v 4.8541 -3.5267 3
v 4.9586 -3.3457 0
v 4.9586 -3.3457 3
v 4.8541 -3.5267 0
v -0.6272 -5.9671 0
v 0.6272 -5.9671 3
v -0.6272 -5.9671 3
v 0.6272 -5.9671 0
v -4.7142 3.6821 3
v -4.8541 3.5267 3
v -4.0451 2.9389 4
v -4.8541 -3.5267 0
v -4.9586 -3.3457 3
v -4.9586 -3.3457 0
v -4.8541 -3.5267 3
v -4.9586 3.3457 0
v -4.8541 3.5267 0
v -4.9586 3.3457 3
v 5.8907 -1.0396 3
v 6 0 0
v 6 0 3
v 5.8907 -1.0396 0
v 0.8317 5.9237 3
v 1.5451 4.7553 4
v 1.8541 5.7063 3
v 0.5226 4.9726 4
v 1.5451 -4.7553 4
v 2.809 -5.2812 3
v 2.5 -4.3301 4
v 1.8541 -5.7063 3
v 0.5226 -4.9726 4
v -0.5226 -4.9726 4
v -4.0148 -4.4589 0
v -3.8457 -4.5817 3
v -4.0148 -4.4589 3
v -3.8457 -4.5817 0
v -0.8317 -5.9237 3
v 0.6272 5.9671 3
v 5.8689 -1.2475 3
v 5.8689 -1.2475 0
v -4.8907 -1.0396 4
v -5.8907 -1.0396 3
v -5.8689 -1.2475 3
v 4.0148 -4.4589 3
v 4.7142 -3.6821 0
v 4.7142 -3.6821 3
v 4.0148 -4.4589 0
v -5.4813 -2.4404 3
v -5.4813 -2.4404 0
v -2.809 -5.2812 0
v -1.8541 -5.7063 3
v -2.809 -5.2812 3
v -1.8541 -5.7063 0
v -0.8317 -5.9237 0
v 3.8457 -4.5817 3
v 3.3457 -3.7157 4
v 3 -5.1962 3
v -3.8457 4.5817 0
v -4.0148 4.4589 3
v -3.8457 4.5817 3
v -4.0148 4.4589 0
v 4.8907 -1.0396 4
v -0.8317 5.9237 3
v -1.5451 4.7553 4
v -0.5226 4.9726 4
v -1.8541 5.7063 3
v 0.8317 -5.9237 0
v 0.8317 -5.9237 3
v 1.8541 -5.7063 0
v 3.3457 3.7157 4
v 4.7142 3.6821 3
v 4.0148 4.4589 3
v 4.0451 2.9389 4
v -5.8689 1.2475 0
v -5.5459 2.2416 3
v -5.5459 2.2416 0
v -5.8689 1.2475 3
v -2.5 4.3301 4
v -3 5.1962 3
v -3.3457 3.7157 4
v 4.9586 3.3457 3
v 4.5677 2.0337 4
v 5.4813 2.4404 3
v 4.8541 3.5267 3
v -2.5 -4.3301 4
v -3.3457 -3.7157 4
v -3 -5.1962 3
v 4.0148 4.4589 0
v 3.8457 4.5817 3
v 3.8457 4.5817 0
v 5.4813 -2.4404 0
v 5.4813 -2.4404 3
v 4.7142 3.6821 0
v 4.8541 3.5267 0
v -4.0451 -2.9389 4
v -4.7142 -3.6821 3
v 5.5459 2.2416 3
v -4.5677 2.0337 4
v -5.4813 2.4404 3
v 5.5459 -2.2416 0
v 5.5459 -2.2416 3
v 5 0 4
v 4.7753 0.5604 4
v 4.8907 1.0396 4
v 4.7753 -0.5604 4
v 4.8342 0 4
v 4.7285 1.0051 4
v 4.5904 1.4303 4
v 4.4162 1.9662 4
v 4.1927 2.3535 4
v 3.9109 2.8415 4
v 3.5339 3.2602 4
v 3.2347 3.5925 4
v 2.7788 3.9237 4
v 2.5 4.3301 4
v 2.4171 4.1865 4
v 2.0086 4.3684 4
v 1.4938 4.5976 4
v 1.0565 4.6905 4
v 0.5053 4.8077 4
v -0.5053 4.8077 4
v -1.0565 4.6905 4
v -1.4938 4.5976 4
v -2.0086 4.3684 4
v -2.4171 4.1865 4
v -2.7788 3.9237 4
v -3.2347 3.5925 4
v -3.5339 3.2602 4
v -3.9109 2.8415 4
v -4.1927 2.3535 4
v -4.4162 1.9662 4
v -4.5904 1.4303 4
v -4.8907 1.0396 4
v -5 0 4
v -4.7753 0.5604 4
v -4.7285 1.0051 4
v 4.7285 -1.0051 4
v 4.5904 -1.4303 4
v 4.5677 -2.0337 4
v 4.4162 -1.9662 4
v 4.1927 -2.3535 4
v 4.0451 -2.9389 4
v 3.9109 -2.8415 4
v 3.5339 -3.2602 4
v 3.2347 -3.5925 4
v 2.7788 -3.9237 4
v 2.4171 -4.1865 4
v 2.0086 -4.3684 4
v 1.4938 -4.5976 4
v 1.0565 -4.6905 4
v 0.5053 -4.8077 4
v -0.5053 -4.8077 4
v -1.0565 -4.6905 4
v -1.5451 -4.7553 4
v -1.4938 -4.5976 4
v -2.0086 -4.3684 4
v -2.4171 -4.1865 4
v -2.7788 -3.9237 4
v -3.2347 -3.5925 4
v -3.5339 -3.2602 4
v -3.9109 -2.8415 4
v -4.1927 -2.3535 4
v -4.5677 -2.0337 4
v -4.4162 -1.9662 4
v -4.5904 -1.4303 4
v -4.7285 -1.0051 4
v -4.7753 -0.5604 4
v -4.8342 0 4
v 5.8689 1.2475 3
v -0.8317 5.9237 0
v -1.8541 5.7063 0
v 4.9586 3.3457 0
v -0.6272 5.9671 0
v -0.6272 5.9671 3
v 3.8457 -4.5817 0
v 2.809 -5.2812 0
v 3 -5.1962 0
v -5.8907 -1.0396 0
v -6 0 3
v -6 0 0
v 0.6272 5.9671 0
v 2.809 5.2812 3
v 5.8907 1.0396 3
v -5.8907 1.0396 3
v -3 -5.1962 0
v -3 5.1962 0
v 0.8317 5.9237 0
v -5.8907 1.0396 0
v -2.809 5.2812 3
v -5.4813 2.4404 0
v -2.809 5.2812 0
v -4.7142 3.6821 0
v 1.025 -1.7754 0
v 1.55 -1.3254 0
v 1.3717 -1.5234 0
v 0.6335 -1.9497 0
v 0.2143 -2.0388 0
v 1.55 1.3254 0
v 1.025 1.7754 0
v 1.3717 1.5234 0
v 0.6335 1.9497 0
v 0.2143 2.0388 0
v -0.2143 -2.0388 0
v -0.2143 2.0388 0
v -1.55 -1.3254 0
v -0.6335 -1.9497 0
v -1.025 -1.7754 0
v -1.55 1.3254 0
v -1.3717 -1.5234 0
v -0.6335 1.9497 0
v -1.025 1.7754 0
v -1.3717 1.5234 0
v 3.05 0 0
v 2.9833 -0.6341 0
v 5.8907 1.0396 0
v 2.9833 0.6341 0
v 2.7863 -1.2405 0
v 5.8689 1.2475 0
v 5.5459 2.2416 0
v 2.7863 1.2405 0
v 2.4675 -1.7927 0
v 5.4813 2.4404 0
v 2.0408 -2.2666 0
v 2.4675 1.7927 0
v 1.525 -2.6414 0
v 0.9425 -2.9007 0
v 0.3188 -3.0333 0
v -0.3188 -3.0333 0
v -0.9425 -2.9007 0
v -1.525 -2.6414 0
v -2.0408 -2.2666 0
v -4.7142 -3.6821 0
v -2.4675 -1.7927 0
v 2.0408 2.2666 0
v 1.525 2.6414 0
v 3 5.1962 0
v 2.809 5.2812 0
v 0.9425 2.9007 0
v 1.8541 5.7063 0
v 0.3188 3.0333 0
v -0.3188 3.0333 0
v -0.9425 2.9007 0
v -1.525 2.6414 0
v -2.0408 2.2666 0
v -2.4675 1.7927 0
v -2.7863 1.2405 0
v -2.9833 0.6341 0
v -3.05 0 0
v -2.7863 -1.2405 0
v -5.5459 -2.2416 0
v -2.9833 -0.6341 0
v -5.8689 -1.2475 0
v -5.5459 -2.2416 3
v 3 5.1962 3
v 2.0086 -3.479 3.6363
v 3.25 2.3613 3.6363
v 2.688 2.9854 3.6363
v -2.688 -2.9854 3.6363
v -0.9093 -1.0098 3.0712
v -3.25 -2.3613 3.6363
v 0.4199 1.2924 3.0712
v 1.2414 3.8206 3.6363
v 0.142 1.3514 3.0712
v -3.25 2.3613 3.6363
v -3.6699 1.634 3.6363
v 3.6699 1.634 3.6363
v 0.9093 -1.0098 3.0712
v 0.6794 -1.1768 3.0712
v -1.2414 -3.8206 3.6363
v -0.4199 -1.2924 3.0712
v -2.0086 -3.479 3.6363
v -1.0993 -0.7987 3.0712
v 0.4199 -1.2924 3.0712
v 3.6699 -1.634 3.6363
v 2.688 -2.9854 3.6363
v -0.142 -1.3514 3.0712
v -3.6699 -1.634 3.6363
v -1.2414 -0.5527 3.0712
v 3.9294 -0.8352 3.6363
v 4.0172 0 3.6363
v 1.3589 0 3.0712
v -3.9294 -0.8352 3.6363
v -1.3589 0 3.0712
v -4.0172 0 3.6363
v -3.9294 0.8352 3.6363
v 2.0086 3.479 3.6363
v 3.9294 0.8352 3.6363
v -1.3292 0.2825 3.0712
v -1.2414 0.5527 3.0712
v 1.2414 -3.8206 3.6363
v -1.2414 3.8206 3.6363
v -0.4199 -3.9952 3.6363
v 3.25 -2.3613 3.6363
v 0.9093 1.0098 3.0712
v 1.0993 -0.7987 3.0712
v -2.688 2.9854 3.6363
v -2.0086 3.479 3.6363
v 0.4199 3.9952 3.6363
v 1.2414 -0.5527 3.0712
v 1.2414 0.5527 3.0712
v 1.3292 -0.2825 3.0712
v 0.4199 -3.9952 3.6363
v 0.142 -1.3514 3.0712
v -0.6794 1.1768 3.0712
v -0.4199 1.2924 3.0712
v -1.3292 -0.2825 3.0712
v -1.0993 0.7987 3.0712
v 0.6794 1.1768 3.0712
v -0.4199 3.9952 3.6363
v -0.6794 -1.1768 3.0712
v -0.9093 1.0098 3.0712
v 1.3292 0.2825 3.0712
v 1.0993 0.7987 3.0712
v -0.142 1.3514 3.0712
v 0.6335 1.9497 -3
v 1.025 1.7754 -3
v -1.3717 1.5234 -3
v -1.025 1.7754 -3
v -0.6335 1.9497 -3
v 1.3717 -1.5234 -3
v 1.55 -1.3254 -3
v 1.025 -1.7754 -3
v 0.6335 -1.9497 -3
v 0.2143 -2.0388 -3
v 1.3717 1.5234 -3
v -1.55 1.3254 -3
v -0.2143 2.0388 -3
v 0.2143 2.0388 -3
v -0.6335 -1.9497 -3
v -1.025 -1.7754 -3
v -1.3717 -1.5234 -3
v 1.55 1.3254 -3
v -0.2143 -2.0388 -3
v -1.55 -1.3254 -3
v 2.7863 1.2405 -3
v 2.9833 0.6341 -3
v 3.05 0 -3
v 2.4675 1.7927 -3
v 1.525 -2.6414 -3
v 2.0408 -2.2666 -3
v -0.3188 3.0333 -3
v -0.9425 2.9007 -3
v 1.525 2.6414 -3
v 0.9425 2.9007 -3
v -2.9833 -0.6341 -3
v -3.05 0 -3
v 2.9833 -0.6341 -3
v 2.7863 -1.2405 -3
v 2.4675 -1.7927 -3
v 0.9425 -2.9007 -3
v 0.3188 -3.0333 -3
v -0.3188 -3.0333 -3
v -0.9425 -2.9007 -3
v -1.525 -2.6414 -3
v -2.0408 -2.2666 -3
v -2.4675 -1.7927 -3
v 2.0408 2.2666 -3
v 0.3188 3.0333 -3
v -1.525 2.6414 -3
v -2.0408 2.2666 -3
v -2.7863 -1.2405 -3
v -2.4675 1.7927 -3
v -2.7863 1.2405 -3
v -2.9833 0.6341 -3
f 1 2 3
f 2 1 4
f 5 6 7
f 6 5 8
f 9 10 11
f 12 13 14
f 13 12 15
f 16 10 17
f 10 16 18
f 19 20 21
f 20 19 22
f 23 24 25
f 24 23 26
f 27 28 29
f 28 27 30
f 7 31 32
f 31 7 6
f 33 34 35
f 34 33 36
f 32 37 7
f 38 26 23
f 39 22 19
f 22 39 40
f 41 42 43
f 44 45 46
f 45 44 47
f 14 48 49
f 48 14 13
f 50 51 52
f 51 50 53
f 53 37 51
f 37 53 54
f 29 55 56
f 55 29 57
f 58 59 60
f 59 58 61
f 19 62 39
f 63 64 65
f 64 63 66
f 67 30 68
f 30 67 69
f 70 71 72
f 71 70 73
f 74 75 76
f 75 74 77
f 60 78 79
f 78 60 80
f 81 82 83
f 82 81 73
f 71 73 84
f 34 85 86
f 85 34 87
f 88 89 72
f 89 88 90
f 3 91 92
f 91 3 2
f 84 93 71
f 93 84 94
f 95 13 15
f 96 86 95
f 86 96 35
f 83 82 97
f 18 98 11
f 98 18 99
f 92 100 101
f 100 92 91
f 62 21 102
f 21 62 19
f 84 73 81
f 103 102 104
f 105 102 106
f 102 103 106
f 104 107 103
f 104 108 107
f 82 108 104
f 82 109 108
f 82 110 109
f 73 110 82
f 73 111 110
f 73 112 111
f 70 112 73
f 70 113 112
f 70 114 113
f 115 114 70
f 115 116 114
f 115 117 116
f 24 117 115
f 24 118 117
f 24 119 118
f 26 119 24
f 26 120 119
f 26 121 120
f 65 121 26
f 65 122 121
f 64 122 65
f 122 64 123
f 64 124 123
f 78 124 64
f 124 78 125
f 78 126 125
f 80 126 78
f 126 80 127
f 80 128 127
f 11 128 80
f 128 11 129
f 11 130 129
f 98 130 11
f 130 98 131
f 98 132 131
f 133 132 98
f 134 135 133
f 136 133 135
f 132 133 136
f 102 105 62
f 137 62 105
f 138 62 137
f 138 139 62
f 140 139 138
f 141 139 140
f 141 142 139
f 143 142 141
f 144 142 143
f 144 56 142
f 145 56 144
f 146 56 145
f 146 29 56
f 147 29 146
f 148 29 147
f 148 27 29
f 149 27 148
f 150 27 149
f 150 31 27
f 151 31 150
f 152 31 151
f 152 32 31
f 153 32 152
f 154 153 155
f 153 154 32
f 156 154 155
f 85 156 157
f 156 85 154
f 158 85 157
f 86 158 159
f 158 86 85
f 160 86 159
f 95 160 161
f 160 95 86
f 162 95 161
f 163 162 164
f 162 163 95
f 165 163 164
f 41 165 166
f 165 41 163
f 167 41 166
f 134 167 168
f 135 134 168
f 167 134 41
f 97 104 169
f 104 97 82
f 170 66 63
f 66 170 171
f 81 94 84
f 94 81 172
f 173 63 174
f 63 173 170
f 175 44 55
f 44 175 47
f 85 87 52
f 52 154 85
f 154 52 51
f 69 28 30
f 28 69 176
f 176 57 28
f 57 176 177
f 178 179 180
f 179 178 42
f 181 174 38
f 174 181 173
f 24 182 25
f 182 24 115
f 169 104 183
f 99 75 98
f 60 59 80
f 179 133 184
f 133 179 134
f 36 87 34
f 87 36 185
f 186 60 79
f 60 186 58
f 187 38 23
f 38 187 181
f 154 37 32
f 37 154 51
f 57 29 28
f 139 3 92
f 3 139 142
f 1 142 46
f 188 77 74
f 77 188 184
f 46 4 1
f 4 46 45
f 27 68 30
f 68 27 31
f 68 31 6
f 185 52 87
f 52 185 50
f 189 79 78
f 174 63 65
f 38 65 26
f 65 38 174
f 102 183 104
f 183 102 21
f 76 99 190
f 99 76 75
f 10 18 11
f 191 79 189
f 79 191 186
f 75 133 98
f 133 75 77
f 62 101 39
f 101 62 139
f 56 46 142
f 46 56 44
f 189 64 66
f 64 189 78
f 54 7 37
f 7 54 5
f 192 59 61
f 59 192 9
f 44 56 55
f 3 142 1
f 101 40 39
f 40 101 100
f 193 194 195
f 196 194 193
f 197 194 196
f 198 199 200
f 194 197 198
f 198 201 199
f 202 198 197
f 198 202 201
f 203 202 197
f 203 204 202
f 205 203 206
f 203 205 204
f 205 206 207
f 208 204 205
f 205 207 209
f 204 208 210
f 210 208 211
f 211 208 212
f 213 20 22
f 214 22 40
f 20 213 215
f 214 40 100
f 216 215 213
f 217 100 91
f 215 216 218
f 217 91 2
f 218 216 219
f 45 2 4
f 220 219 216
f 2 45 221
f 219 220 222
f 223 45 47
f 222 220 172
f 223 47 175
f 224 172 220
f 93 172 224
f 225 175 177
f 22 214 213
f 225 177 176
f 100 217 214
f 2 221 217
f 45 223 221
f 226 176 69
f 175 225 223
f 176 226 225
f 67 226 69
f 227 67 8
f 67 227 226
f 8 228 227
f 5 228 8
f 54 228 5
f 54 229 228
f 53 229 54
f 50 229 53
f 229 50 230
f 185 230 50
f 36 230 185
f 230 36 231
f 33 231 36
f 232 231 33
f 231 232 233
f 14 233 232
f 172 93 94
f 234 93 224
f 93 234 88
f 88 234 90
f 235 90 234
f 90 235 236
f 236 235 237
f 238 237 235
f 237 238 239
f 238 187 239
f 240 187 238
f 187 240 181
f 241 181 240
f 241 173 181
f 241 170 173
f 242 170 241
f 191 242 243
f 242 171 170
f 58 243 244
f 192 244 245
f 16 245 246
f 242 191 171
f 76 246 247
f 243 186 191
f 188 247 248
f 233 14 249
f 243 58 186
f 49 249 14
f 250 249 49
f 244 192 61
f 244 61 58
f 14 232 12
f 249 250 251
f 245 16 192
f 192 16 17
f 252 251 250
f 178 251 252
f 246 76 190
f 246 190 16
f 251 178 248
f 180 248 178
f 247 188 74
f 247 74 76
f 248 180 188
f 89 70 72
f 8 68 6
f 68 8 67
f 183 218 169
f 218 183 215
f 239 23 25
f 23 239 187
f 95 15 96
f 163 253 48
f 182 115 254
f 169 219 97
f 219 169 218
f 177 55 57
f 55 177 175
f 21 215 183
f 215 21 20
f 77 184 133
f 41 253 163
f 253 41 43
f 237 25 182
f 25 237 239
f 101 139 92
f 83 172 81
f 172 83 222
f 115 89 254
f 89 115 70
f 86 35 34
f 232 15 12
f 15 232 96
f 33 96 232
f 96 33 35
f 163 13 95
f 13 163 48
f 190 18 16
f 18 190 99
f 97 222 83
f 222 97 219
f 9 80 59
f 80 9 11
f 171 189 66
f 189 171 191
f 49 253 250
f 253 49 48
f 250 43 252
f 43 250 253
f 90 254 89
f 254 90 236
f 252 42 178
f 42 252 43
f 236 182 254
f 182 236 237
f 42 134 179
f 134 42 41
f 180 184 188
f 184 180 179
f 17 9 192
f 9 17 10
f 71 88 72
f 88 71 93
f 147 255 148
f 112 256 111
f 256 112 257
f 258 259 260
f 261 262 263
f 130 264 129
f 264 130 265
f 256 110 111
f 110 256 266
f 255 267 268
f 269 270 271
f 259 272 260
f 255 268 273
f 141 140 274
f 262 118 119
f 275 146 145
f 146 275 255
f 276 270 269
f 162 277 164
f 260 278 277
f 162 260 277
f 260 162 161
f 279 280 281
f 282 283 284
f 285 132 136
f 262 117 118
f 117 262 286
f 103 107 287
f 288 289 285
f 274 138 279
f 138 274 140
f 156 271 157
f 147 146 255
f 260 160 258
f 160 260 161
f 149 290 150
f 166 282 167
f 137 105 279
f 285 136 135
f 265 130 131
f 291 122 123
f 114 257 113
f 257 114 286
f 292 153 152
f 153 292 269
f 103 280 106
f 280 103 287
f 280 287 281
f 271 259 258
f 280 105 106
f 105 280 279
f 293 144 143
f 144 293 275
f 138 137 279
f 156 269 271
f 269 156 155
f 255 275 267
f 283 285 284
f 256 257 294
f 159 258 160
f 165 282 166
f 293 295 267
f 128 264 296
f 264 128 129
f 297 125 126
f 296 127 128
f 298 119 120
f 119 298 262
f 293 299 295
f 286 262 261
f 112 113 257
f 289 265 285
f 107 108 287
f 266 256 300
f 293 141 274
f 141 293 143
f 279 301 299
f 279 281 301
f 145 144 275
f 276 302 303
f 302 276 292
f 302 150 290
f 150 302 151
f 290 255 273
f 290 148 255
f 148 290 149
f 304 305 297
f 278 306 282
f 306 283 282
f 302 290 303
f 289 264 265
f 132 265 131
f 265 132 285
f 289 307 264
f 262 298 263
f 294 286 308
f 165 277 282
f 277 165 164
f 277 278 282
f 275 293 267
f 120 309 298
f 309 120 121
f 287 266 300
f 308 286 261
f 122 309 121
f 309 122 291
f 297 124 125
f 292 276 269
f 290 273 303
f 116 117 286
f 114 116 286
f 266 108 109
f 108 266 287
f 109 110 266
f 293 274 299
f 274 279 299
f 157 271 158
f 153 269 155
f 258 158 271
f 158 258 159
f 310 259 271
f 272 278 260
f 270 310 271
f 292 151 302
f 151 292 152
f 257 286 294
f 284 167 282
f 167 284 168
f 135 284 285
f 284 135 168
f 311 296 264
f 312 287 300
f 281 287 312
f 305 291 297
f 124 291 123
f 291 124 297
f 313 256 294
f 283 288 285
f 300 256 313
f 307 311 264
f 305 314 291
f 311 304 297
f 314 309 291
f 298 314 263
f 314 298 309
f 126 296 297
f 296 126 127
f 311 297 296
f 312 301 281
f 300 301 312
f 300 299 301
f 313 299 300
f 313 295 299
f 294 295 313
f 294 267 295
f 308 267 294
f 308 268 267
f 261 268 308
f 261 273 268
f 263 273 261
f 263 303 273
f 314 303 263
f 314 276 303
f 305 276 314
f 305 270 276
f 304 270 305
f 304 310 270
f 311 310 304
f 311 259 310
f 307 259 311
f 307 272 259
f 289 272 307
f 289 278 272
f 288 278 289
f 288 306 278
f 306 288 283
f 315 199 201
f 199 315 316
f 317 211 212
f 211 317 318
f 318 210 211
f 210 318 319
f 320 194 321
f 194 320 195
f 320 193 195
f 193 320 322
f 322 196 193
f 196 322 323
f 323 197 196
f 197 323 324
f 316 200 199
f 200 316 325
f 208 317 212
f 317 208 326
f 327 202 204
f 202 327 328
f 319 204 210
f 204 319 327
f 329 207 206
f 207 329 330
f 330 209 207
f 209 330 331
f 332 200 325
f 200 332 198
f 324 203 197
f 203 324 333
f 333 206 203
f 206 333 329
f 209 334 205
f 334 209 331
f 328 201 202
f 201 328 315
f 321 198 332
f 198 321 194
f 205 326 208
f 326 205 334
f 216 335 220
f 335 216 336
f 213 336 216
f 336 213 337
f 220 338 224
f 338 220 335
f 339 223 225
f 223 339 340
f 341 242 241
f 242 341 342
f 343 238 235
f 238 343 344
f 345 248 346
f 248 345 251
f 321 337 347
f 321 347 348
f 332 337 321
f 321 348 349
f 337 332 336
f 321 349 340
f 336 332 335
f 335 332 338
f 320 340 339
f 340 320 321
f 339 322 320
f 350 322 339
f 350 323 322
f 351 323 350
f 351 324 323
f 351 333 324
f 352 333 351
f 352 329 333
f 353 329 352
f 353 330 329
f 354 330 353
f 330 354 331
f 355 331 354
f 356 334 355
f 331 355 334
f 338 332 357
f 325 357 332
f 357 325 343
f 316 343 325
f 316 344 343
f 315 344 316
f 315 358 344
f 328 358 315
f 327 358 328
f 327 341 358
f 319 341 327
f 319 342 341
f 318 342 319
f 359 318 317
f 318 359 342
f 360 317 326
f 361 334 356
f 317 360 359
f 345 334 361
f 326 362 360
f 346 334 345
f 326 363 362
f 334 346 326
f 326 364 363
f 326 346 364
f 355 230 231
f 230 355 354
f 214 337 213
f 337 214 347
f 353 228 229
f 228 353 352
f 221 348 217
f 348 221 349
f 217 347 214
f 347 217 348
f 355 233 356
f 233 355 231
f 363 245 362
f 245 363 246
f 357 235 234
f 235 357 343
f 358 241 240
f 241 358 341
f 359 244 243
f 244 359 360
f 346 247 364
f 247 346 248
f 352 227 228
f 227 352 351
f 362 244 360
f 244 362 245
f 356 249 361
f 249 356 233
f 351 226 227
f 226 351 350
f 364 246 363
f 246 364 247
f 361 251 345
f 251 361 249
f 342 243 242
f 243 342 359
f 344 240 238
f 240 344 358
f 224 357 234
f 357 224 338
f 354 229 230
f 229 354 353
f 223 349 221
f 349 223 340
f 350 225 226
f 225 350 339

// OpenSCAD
$fs = 0.01;
sqrt_3 = 1.7320508;
sticktop_diameter = 12; 
sticktop_height = 4;
sticktop_dimple = 1;
stem_thickness = 1.0;
stem_c_diameter = 4.1;
stem_l_interval = 3.1;
stem_height = 3.0;





translate([20, 0 ,0]){

}



module cylinderOneSideChamfered (diameter, height, depth) 
{
    minkowski () {
        cylinder(d = diameter-2*depth, h = height-(1*depth));
        cylinder(h= depth, r1 = depth, r2 =0);
    }
}


difference() {
    cylinderOneSideChamfered(sticktop_diameter, sticktop_height, 1);
    translate([0, 0, sticktop_height+(sticktop_dimple^2 + (sticktop_diameter/2-1)^2)/(2*sticktop_dimple)-sticktop_dimple]){
        sphere((sticktop_dimple^2 + (sticktop_diameter/2-1)^2)/(2*sticktop_dimple));
    }
}
//cylinder(d = sticktop_diameter, h = sticktop_height);

translate([0, 0, -stem_height]) 
{
    difference () 
    {
        cylinder(d = 2 * stem_thickness + stem_c_diameter, h = stem_height);      
        translate([0,0,-0.2]) 
        {
            difference () 
            {
                cylinder(d = stem_c_diameter, h = stem_height+0.4);
                translate([stem_c_diameter/2 + stem_l_interval/2, 0, 0]) 
                    cube([stem_c_diameter, stem_c_diameter, 10], center=true);
                translate([-stem_c_diameter/2 - stem_l_interval/2, 0, 0]) 
                    cube([stem_c_diameter, stem_c_diameter, 10], center=true);
            }
        }
    }
}
